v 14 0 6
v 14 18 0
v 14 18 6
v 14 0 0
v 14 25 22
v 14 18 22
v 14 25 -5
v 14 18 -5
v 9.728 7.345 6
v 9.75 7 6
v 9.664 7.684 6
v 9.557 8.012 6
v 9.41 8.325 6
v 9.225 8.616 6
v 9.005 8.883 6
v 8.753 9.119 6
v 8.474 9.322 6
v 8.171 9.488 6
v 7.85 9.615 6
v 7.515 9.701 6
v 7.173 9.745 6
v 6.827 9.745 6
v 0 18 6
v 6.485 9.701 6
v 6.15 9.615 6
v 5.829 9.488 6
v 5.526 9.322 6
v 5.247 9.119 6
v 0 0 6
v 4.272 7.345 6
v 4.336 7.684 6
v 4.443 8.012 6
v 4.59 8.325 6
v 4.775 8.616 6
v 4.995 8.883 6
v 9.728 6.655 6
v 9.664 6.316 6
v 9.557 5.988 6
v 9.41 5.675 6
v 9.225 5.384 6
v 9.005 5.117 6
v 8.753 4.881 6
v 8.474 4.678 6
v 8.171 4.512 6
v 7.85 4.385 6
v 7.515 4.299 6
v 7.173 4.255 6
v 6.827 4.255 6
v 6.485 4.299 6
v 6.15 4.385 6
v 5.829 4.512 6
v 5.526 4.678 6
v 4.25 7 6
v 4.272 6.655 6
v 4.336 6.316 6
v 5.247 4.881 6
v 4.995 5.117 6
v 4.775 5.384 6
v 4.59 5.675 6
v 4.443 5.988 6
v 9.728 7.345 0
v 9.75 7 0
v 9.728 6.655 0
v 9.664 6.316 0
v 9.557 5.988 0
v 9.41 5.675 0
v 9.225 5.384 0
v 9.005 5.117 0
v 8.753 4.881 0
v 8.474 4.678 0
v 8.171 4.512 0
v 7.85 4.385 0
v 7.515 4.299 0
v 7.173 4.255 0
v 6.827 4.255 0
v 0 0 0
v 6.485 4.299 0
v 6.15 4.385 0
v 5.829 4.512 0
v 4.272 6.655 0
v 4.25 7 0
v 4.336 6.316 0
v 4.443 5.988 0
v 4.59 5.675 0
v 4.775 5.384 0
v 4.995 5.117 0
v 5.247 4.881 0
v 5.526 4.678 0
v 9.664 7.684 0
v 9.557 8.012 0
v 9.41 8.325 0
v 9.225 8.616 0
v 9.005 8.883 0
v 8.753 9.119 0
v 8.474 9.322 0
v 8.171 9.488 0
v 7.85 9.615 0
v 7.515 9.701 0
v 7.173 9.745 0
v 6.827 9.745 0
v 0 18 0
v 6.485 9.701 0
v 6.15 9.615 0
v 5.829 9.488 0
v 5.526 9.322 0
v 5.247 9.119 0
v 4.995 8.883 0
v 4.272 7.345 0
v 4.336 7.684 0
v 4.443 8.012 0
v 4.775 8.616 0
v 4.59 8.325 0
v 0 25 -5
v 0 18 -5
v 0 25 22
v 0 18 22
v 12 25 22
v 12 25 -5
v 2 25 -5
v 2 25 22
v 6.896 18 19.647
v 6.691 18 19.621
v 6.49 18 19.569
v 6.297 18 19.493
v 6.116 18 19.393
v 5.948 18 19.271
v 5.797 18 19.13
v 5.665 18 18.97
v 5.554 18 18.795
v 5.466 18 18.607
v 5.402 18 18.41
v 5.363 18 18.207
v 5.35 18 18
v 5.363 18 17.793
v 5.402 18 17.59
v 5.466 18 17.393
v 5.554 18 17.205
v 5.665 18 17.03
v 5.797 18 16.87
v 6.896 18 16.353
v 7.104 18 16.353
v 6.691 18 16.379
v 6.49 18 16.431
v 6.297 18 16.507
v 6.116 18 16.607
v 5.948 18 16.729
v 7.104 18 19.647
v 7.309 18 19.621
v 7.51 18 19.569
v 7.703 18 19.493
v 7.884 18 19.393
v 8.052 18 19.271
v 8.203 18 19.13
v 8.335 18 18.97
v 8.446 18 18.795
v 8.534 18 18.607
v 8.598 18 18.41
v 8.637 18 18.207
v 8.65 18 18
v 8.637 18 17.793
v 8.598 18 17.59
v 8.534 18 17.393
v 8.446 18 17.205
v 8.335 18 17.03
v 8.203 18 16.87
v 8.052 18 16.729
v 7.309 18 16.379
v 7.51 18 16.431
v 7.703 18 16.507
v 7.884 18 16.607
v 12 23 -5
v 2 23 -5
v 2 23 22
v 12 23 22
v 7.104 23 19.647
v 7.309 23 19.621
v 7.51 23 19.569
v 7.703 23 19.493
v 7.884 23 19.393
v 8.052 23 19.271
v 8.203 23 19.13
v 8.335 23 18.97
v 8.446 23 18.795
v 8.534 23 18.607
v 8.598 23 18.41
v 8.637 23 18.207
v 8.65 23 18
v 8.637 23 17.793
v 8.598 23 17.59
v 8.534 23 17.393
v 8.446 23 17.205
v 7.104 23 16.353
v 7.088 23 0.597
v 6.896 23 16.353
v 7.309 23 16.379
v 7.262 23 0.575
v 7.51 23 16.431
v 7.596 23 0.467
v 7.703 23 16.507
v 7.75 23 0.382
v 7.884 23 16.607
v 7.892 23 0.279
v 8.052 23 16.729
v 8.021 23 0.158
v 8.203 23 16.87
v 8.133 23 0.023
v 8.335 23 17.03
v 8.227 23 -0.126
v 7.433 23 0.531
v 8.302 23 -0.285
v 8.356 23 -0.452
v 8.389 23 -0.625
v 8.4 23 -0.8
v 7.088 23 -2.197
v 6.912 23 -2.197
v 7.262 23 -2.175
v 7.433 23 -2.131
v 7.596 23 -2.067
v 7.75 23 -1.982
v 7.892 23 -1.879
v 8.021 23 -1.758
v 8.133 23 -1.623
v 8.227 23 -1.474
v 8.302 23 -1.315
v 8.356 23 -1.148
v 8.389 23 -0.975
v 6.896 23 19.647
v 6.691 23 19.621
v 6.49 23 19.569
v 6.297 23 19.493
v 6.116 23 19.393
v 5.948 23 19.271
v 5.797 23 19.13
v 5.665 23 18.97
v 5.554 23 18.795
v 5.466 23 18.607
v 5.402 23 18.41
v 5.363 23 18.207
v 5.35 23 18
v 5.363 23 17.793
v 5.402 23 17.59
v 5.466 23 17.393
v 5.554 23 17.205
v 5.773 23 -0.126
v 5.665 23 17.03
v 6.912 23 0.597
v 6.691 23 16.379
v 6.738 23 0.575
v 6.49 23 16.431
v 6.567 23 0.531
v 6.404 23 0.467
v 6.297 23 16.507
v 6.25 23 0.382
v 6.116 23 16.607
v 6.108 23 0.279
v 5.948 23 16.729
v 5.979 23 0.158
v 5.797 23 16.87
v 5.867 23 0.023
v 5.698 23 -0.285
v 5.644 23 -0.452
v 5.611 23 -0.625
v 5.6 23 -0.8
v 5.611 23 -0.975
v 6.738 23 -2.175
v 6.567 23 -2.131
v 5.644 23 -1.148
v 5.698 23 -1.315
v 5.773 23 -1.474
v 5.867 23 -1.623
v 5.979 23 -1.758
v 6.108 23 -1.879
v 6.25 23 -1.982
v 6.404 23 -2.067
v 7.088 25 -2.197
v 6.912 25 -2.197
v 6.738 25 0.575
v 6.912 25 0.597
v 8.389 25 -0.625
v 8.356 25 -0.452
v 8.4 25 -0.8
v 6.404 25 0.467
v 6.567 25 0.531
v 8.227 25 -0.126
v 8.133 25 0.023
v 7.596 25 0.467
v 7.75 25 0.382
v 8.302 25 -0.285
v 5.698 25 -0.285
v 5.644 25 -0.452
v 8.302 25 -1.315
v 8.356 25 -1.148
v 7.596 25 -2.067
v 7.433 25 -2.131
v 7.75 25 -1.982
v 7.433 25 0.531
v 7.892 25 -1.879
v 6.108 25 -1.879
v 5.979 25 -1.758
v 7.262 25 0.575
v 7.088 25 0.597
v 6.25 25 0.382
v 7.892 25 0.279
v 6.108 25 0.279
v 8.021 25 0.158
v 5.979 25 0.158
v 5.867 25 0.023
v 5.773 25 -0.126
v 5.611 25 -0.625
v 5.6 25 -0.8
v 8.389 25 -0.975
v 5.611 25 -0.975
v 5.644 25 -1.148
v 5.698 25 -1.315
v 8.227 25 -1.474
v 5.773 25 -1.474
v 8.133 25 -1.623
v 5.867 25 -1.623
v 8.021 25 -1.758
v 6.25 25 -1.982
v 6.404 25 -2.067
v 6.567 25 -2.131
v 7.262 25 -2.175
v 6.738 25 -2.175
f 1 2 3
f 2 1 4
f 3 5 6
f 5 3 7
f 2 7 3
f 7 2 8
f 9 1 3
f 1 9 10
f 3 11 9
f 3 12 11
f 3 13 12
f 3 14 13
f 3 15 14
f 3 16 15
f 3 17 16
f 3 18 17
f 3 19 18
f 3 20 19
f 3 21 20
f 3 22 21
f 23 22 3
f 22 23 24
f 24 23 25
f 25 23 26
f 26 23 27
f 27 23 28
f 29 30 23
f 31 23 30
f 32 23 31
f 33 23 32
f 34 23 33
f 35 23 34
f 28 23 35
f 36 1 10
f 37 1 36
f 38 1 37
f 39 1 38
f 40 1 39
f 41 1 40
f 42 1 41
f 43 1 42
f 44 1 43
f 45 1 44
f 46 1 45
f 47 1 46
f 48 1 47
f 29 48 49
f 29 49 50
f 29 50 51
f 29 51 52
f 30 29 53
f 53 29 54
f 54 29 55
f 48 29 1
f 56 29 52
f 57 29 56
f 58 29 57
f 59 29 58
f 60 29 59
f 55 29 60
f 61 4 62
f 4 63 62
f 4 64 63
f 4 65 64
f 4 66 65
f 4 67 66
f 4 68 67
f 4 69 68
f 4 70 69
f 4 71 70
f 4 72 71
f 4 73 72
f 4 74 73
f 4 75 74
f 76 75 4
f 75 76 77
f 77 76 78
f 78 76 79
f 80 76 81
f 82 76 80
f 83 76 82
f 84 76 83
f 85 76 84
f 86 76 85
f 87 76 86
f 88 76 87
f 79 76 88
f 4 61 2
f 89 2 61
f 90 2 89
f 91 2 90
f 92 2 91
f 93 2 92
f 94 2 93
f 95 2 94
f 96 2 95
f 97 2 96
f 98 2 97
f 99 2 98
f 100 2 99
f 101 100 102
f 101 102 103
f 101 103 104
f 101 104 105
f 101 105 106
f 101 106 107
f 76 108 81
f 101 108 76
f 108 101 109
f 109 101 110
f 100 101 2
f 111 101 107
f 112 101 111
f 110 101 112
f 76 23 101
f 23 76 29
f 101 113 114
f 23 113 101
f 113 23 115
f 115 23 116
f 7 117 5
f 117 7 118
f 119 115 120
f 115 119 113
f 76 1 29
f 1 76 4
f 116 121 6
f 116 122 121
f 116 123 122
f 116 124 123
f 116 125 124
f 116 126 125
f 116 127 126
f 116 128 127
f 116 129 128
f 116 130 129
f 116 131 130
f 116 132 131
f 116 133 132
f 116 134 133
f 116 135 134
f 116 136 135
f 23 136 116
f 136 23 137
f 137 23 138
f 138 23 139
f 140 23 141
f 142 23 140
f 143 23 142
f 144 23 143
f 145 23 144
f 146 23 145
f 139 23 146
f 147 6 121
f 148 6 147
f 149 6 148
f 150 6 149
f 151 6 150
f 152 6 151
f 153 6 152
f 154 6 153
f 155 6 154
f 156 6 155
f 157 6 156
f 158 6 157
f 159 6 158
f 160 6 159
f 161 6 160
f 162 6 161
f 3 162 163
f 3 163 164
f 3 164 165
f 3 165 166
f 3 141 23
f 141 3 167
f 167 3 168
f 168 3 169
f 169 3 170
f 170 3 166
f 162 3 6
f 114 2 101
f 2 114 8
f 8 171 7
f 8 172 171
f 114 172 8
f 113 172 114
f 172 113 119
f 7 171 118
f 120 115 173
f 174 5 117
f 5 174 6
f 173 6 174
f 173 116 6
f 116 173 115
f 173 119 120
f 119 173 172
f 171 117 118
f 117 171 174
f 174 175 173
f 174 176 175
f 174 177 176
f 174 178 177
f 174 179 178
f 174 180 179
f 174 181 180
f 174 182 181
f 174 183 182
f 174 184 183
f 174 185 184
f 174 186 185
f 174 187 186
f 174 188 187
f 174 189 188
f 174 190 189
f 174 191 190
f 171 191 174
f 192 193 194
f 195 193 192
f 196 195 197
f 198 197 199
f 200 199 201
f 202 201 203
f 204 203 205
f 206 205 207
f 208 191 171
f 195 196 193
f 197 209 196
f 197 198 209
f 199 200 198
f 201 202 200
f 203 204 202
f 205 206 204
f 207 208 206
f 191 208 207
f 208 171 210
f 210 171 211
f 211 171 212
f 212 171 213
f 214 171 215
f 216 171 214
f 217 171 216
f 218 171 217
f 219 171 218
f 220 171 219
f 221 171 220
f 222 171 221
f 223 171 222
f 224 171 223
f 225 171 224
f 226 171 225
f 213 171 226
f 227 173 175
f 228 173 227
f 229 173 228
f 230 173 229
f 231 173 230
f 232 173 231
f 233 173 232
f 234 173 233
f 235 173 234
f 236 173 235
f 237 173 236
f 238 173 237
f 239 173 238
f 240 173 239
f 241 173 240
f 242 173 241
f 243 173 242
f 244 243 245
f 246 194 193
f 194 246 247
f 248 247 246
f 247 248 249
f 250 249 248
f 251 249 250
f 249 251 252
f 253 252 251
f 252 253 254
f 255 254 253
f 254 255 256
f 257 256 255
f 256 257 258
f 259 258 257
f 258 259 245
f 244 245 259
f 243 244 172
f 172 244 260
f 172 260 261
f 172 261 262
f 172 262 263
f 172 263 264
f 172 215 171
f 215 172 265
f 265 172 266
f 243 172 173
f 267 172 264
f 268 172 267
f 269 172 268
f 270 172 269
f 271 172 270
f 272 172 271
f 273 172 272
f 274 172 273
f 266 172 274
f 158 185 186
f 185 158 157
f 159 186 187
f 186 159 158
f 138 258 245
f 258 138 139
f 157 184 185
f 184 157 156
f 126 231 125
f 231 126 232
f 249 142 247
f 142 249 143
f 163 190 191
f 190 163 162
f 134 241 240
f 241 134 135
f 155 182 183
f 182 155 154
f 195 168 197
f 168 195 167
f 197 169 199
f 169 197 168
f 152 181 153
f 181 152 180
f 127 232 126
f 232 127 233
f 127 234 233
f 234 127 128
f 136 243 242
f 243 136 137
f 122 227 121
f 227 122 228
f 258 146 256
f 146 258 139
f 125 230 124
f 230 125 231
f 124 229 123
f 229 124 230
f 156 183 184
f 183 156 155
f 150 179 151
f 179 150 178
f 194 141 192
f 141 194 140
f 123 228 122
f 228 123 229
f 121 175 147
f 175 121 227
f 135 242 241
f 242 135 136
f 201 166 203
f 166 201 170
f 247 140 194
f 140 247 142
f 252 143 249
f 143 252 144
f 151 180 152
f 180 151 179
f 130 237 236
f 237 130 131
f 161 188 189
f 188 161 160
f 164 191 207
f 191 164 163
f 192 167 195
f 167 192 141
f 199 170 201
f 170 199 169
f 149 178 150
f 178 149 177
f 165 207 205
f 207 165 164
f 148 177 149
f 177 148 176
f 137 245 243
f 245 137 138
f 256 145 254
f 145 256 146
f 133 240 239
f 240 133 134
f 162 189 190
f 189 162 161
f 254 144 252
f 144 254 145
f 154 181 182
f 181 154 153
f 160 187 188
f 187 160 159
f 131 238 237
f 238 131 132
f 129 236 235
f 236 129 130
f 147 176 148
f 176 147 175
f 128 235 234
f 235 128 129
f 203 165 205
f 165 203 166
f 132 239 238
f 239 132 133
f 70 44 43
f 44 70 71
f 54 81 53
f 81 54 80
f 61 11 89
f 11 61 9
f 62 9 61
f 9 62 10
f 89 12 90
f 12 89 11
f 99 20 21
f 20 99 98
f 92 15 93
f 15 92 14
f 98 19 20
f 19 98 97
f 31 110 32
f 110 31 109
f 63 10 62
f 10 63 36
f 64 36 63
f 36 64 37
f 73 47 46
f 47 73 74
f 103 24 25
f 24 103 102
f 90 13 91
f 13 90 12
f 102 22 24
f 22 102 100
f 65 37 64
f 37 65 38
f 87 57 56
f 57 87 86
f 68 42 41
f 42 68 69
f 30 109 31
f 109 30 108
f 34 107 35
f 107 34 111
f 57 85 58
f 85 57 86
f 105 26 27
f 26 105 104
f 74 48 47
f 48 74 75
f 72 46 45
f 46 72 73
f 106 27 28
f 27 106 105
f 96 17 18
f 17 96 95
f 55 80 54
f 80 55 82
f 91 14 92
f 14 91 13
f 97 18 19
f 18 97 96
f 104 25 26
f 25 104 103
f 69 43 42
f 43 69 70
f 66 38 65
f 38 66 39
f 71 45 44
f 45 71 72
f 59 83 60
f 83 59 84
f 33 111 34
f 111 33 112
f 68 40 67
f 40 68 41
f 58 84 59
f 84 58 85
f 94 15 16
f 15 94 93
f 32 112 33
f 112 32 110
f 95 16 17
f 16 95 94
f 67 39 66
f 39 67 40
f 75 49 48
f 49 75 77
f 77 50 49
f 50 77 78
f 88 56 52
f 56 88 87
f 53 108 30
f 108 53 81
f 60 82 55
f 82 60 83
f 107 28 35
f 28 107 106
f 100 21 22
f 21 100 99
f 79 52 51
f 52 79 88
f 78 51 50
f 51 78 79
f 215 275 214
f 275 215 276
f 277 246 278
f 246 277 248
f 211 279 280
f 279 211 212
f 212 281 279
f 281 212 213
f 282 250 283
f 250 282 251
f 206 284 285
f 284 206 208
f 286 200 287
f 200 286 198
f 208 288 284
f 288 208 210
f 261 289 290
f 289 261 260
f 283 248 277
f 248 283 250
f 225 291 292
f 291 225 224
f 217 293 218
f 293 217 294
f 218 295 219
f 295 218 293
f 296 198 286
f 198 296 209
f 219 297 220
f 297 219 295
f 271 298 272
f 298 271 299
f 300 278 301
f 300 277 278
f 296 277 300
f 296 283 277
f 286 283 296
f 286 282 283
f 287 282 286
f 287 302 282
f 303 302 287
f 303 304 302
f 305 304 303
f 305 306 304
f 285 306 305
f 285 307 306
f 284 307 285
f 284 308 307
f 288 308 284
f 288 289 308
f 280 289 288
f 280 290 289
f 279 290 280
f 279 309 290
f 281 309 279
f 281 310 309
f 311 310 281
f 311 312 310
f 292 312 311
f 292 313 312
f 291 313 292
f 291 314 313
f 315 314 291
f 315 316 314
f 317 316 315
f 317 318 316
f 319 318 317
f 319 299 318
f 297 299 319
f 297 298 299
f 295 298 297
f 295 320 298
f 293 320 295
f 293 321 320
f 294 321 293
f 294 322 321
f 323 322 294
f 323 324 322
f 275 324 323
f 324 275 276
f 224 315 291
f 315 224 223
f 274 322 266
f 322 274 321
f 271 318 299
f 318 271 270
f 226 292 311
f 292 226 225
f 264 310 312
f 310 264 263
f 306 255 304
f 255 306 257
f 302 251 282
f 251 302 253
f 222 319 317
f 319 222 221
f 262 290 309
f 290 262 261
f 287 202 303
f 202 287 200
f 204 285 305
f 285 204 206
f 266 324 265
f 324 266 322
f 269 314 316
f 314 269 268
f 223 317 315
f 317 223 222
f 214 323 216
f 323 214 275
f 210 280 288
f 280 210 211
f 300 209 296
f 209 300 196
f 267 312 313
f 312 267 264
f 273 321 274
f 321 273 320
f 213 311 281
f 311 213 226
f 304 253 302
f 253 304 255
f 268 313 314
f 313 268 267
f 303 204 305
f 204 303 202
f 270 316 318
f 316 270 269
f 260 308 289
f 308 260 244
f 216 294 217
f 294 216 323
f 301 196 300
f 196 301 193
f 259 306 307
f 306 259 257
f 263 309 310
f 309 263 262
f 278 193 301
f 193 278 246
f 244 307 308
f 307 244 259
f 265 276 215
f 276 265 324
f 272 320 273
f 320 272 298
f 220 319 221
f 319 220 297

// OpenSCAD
$fn = 50;

difference()
{
    union()
    {
        cube([14, 25, 6]);
    translate ([0, 25, - (27 - 22)]) rotate ([90, 0, 0]) cube([14, 27, 7]);
    }
    
    union()
    {
        translate ([2, 25, - (27 - 22)]) rotate ([90, 0, 0]) cube([10, 27, 2]);
        translate ([14 / 2, 25, 18]) rotate([90, 0, 0]) cylinder(h=20, r=3.3 / 2, center=true);
        translate ([14 / 2, 7, 0]) cylinder(h=20, r=5.5 / 2, center=true);
    }
}
    translate ([14 / 2, 22.5, -0.8]) rotate([90, 0, 0]) cylinder(h=5, r=2.8 / 2, center=true);
